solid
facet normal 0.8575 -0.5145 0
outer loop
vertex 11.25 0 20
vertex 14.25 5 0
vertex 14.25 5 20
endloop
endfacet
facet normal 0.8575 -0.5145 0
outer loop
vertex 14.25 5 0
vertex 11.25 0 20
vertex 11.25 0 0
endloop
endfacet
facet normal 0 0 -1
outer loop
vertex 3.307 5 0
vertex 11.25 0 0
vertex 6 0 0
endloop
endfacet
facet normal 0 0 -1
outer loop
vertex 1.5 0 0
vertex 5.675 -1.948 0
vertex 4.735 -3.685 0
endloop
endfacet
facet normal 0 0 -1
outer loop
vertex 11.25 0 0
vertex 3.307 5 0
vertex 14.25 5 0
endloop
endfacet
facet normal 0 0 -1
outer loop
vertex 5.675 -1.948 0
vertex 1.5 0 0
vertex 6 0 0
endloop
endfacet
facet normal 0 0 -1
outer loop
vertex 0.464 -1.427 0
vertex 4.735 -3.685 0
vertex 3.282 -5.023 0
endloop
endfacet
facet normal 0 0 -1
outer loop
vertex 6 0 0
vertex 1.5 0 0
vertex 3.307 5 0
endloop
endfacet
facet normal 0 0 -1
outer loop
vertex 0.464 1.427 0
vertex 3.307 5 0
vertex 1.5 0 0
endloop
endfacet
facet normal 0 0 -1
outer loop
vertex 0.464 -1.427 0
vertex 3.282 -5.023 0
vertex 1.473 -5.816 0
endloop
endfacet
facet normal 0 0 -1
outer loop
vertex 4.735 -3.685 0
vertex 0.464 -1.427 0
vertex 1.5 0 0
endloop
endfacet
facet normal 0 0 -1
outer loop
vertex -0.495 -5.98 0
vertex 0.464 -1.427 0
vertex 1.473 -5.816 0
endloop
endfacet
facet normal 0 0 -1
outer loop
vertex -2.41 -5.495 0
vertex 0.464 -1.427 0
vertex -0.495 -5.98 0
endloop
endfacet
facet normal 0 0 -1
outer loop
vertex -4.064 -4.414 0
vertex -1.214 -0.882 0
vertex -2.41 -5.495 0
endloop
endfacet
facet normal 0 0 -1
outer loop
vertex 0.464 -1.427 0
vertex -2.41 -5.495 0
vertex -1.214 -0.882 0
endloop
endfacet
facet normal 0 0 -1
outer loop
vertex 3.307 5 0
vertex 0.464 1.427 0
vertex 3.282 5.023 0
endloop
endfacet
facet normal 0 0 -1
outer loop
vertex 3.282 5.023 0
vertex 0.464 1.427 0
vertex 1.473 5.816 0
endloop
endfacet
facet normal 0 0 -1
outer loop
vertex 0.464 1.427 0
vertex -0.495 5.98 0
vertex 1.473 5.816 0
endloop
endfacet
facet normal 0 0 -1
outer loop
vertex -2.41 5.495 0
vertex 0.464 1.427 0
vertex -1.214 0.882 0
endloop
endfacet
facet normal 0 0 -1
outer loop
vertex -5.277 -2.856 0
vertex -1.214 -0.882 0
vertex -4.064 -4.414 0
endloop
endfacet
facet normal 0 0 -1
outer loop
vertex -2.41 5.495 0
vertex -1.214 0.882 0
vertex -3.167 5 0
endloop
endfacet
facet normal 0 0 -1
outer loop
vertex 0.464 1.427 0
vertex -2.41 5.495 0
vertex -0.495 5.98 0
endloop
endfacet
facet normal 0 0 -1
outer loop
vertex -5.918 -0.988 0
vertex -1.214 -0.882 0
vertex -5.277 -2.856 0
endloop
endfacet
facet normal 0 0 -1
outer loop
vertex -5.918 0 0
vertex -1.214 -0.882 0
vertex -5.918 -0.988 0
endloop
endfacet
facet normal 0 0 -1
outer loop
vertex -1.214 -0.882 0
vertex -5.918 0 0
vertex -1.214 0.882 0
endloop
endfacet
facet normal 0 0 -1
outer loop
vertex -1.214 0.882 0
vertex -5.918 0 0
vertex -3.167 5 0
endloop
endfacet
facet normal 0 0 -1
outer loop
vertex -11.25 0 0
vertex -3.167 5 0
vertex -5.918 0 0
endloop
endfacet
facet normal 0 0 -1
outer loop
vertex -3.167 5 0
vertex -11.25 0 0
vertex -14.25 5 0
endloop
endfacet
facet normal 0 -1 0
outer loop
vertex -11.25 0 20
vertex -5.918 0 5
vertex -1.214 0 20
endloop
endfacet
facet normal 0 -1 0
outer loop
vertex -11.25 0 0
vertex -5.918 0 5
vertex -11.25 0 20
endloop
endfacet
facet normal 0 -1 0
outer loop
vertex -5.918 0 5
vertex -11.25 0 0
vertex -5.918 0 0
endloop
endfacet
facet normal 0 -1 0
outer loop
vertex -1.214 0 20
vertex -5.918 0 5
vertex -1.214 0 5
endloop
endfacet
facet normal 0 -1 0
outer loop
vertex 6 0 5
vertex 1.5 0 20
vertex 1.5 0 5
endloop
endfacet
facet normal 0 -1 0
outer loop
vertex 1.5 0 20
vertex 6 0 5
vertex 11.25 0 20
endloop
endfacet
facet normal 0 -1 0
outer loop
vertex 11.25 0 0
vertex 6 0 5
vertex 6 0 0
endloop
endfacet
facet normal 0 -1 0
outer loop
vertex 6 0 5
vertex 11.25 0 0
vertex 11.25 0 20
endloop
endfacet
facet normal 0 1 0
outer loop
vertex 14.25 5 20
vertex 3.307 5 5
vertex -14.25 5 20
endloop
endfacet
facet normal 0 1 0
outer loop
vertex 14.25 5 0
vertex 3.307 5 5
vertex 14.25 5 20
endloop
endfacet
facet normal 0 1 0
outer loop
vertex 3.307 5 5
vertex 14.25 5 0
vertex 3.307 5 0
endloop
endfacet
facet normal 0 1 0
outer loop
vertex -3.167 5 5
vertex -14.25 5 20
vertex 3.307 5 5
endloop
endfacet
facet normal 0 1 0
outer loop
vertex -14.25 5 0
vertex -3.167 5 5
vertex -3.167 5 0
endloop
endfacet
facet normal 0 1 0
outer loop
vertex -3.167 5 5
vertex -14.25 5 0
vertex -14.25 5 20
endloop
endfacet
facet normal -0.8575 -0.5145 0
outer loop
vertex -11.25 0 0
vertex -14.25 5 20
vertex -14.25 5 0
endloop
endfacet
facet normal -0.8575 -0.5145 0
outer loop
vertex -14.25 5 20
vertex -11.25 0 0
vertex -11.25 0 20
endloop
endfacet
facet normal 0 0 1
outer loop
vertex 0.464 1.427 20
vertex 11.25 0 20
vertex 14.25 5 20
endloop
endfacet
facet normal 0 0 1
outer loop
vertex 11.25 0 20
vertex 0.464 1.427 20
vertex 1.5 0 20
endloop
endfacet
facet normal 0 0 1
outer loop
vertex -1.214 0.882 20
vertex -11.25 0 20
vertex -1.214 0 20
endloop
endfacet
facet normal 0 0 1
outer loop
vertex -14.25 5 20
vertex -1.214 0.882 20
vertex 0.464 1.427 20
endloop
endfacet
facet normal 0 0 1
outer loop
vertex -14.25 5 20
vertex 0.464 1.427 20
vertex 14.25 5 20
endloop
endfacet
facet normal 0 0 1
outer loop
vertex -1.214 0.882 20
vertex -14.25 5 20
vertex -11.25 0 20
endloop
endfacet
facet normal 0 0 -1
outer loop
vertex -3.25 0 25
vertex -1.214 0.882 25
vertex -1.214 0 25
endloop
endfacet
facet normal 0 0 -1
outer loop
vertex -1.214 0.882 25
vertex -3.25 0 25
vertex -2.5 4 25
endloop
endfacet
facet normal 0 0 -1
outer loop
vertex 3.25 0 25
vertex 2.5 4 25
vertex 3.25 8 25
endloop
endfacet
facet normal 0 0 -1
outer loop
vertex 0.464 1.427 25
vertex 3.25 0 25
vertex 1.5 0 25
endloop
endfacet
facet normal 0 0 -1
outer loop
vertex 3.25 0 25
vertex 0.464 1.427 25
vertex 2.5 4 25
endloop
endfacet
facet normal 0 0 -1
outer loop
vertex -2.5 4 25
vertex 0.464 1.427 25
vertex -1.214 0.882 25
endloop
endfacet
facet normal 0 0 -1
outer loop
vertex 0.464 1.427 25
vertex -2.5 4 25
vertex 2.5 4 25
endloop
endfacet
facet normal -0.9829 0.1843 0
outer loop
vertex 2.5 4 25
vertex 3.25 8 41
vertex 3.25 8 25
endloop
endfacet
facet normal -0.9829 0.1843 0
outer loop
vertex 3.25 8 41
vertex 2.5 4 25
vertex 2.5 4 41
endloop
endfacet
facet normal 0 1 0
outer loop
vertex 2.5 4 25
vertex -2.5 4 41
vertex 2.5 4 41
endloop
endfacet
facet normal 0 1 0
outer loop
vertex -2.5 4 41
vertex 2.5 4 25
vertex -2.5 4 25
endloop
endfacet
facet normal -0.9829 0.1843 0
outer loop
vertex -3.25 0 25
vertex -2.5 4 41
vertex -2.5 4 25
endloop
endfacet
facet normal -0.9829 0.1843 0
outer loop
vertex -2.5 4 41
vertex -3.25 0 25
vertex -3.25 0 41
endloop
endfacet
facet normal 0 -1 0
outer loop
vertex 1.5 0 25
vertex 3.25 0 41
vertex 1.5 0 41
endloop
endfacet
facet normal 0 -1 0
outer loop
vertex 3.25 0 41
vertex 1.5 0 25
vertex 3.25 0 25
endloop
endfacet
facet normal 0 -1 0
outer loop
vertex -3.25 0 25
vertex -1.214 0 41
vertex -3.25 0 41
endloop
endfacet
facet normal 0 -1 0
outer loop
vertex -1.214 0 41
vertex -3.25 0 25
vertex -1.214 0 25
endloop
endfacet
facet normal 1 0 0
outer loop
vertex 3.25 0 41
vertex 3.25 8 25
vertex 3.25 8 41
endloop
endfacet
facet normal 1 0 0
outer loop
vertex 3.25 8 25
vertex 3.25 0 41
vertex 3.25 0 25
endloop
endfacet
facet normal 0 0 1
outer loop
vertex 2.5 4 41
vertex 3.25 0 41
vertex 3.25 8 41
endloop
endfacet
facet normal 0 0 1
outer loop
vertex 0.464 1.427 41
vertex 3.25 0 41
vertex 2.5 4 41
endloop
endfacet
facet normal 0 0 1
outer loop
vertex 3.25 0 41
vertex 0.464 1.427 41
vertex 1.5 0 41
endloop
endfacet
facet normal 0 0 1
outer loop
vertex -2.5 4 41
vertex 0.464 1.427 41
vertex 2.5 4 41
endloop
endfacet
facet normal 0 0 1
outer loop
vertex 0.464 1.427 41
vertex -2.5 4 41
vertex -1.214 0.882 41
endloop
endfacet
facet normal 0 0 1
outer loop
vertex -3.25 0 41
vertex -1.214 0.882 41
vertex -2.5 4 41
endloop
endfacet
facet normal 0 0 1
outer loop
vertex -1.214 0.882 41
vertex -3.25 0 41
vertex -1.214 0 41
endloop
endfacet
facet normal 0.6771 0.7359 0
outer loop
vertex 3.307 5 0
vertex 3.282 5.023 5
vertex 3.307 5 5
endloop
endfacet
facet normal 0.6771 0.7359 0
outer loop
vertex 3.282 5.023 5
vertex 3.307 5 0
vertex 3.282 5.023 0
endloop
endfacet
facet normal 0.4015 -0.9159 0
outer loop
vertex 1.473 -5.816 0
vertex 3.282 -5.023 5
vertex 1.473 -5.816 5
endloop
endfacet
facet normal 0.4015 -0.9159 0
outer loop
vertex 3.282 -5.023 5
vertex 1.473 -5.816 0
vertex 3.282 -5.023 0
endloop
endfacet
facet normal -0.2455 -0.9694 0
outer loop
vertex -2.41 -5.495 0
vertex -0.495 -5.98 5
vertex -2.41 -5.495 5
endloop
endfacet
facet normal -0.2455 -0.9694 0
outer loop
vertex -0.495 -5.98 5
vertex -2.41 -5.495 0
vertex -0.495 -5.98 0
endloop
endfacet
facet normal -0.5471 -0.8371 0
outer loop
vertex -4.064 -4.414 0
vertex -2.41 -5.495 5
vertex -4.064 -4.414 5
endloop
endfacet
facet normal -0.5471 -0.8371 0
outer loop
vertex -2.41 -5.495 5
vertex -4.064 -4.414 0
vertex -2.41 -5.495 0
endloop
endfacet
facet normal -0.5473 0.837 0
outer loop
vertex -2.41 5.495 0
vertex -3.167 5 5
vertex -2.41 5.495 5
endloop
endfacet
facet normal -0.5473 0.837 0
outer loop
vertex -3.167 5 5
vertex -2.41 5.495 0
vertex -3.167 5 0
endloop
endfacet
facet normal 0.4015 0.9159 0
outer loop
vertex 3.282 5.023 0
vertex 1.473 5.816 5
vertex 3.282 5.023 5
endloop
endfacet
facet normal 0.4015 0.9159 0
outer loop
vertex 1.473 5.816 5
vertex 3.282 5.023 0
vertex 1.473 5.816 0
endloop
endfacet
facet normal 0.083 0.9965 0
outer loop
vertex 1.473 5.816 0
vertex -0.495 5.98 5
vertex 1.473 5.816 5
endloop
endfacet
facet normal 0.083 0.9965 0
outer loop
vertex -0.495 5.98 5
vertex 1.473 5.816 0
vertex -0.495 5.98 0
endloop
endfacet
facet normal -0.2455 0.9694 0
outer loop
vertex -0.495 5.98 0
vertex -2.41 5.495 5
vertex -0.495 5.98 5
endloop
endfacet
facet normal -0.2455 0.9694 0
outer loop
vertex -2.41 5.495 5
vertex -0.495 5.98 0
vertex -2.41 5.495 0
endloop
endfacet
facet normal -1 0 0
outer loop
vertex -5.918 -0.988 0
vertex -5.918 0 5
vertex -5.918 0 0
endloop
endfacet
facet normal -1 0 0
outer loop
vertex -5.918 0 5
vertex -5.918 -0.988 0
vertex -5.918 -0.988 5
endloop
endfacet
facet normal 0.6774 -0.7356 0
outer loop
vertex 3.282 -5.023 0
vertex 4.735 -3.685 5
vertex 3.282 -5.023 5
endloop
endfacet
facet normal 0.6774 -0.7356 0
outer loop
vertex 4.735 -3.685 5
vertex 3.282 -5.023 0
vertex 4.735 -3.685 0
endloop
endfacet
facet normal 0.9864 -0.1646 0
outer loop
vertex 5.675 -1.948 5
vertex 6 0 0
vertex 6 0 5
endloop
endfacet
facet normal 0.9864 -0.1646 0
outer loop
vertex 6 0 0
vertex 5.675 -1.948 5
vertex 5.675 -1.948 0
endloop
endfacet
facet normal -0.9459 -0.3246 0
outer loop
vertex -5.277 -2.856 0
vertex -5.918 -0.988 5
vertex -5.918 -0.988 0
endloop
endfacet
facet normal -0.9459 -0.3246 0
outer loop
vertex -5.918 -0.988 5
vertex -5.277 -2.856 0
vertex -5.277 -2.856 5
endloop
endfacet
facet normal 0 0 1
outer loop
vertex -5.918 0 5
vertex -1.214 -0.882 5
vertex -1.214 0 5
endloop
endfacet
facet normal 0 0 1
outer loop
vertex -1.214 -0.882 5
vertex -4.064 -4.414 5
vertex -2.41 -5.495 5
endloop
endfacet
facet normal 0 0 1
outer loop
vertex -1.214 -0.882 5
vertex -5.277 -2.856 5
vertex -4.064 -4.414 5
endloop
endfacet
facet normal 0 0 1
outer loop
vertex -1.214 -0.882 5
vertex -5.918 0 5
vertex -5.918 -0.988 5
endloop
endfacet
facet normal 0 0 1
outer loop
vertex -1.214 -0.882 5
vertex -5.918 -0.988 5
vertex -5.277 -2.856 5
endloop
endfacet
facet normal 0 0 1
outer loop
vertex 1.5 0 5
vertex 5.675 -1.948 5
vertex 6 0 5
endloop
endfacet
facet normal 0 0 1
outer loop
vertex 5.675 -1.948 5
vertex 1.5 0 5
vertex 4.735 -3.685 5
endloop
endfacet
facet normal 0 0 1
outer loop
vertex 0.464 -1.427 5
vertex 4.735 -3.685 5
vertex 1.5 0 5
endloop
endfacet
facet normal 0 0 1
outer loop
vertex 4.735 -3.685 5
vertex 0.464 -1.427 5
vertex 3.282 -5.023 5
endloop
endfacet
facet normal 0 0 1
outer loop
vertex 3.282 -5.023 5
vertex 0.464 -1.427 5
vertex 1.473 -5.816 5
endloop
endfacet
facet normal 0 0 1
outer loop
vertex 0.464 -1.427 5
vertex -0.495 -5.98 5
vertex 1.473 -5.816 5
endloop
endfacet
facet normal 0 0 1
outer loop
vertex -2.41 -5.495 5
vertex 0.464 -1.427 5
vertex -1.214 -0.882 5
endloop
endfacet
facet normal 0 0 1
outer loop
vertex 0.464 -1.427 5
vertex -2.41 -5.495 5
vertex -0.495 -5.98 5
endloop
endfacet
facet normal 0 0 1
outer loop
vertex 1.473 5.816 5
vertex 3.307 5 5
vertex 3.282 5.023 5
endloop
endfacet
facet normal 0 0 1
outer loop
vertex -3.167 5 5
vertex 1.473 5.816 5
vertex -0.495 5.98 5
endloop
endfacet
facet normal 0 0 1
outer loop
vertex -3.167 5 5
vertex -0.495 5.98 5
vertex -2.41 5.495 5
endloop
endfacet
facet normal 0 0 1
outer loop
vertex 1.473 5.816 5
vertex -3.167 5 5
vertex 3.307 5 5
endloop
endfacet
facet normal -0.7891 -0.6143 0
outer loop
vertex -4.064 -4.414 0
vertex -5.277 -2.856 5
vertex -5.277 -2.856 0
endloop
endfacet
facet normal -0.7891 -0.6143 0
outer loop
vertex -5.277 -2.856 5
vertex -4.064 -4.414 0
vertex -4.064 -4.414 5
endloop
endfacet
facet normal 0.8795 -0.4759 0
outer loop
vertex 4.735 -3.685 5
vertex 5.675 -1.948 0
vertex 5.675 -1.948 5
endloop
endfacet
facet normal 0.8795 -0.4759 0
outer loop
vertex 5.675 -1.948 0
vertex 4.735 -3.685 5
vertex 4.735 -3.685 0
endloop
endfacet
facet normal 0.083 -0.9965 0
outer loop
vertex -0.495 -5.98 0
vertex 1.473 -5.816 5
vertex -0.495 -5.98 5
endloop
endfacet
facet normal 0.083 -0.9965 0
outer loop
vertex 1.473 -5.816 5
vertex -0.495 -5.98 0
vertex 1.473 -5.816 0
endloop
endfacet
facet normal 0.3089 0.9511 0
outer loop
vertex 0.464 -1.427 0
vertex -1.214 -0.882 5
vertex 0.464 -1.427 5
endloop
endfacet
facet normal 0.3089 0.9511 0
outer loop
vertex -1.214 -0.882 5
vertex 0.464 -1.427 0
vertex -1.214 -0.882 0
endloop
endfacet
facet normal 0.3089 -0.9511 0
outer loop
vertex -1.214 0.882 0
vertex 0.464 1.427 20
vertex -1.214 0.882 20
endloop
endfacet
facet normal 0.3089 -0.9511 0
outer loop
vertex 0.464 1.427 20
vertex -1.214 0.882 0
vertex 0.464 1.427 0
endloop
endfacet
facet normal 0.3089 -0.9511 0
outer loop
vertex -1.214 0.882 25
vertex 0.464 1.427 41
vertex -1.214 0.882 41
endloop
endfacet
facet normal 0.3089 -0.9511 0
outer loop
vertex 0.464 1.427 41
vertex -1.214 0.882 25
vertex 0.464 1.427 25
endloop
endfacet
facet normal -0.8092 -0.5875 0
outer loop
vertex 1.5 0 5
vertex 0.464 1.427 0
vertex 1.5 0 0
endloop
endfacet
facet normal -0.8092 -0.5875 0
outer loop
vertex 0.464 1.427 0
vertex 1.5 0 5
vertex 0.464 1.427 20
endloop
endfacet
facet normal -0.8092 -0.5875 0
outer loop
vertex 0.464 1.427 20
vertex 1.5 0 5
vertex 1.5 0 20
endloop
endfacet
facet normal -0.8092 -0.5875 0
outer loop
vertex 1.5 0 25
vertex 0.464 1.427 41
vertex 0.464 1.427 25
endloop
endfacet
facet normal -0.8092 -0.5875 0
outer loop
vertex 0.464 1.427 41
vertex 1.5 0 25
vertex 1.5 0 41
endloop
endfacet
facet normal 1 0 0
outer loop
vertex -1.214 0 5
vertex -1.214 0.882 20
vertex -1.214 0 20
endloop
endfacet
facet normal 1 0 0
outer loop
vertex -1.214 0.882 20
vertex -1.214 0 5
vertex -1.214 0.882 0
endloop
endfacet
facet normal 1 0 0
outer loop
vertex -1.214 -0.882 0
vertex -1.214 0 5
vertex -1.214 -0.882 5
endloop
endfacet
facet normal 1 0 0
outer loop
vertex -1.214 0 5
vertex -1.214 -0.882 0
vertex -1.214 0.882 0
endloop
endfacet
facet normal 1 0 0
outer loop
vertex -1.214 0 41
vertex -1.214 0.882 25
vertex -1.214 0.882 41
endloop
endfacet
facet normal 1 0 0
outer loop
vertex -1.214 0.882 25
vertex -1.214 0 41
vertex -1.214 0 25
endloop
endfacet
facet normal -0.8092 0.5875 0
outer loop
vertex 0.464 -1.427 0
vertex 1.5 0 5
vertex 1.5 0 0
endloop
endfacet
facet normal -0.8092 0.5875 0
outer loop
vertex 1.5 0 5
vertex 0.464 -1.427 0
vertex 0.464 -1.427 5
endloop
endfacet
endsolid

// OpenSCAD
// Tubing reducer - joins two sizes of silicone tubing via barbs and a collar
// Print orientation: standing upright along +Z, centred on origin in X/Y

// ---------------- Parameters ----------------
reducer_d      = 8;   // outer diameter of the 8 mm tubing (at the joint)
reducer_d2     = 5;   // outer diameter of the 5 mm tubing (at the joint)
bore_d         = 3;   // through-bore diameter along Z
sawtooth_d     = 7.5; // outer diameter of sawtooth barbs at their bottom
sawtooth_d2    = 9.5; // outer diameter of sawtooth barbs at their top
sawtooth_h     = 10;  // height of each sawtooth barb
sawtooth_n     = 2;   // number of stacked sawtooth barbs
collar_d       = 12;  // outer diameter of the cylindrical collar
collar_h       = 5;   // height of the collar
sawtooth_d3    = 6.5; // outer diameter of small barbs at their bottom
sawtooth_d4    = 5.0; // outer diameter of small barbs at their top
sawtooth_h2    = 8;   // height of each small barb
sawtooth_n2     = 2;  // number of stacked small barbs
eps            = 0.5; // overshoot for clean boolean cuts

total_h = sawtooth_n * sawtooth_h + collar_h + sawtooth_n2 * sawtooth_h2; // 45 mm

// ---------------- Model ----------------
difference() {
    union() {
        // 8 mm tubing section: stacked sawtooth barbs
        for (i = [0 : sawtooth_n - 1])
            translate([0, 0, i * sawtooth_h])
                linear_extrude(height = sawtooth_h)
                    polygon([[-1.5 * sawtooth_d, 0], [-1.5 * sawtooth_d2, sawtooth_h / 2],
                             [1.5 * sawtooth_d2, sawtooth_h / 2], [1.5 * sawtooth_d, 0]]);

        // Collar section
        cylinder(d = collar_d, h = collar_h);

        // 5 mm tubing section: stacked shrinking barbs
        for (i = [0 : sawtooth_n2 - 1])
            translate([0, 0, sawtooth_n * sawtooth_h + collar_h + i * sawtooth_h2])
                linear_extrude(height = sawtooth_h2)
                    polygon([[sawtooth_d3 / 2, 0], [sawtooth_d3 / 2, sawtooth_h2],
                             [sawtooth_d4 / 2, sawtooth_h2 / 2], [-sawtooth_d4 / 2, sawtooth_h2 / 2],
                             [-sawtooth_d3 / 2, 0]]);
    }

    // Through-bore along Z
    translate([0, 0, -eps])
        cylinder(d = bore_d, h = total_h + 2 * eps);
}
